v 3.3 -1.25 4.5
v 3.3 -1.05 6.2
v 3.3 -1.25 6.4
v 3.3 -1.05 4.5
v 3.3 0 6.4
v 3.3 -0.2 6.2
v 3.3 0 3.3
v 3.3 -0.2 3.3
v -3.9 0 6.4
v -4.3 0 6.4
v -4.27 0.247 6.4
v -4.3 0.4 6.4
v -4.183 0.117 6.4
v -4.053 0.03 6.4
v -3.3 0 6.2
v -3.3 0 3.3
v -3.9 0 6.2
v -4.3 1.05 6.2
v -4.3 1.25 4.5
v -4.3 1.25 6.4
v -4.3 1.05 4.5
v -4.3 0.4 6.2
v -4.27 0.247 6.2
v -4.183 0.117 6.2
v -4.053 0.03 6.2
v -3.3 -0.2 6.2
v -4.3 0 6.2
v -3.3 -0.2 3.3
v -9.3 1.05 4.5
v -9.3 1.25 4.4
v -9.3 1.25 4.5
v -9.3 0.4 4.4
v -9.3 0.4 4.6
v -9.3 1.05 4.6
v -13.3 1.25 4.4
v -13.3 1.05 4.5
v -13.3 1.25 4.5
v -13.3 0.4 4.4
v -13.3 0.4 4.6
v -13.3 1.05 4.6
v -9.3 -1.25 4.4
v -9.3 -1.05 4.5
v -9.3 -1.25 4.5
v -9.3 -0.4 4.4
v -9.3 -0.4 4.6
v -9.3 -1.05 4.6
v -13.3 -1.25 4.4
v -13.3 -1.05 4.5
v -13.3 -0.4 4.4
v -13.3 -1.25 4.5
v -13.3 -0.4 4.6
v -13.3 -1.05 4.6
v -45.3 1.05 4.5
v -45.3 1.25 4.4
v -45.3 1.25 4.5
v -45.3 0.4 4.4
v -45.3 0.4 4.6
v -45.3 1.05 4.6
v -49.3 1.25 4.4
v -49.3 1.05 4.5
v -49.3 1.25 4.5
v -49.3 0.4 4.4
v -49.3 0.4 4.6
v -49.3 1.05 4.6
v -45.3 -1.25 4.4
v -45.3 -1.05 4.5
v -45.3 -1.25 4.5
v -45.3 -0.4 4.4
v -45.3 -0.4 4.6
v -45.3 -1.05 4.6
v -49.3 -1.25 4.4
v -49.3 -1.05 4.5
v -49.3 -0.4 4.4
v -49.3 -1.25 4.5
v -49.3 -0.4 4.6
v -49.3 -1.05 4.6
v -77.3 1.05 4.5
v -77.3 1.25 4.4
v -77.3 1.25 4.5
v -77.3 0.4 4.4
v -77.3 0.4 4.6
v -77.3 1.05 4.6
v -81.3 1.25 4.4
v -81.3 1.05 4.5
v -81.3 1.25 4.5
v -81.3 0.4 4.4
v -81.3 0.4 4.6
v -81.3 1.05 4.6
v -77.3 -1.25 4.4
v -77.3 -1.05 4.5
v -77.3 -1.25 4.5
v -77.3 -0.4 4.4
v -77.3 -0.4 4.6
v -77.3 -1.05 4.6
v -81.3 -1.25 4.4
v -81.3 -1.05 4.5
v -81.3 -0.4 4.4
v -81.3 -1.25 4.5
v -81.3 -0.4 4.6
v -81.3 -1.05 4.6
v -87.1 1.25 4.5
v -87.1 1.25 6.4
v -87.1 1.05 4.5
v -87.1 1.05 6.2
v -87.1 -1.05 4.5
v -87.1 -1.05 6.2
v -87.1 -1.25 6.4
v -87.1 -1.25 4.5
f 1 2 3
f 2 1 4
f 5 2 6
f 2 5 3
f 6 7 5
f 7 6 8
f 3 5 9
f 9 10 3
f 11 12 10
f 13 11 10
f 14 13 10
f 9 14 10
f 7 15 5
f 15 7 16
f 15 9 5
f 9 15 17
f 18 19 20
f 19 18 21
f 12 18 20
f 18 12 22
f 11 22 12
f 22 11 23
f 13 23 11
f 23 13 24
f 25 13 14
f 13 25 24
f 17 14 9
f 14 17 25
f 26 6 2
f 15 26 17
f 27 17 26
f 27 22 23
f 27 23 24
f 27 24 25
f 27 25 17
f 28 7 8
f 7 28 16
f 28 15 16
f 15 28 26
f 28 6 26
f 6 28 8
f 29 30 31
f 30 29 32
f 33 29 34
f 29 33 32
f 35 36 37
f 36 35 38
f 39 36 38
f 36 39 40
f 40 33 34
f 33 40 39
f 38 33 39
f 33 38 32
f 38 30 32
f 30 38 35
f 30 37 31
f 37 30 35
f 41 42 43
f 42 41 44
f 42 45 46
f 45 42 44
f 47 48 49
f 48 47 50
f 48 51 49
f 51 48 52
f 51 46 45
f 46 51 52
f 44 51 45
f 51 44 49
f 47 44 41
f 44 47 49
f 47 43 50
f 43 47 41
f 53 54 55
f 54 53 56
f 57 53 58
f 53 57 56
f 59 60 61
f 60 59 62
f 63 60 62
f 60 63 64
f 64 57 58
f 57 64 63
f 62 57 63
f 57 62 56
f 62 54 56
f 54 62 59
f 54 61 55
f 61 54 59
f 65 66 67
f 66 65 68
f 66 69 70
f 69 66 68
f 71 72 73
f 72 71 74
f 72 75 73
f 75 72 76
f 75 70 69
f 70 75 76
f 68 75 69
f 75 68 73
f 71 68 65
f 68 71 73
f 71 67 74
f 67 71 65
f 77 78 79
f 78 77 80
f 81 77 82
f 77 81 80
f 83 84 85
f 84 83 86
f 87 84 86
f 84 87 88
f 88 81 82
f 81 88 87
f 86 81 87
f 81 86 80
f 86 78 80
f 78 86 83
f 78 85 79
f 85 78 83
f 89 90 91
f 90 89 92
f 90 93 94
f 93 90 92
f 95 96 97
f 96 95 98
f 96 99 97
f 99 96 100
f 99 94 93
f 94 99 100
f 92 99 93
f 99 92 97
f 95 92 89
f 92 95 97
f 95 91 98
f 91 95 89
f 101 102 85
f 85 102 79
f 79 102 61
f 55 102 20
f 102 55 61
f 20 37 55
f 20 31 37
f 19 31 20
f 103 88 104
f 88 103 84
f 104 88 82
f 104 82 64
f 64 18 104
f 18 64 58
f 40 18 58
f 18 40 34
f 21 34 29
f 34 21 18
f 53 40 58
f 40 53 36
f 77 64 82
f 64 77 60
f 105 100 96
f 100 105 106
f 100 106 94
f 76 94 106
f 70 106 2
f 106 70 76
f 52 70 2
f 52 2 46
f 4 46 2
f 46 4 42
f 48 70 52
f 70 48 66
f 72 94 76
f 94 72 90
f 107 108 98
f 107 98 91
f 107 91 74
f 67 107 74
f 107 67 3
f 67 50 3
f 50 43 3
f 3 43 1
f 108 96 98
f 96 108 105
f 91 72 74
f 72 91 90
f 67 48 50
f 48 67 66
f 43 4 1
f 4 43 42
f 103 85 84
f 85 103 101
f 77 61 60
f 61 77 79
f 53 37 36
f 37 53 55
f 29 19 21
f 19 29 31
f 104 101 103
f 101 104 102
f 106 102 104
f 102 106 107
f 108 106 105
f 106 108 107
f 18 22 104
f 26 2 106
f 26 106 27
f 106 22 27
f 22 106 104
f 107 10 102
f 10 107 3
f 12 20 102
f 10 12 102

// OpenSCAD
// file: ../p/1-4edge.scad
use <../lib.scad>
function ldraw_lib__1_4edge() = [
// 0 Circle 0.25
// 0 Name: 1-4edge.dat
// 0 Author: James Jessiman
// 0 !LDRAW_ORG Primitive UPDATE 2017-01
// 0 !LICENSE Licensed under CC BY 4.0 : see CAreadme.txt
// 
// 0 BFC CERTIFY CCW
  [0,"BFC","CERTIFY"],
  [0,"BFC","CCW"],
// 
// 0 !HISTORY 2007-06-22 [PTadmin] Header formatted for Contributor Agreement
// 0 !HISTORY 2008-07-01 [PTadmin] Official Update 2008-01
// 0 !HISTORY 2017-01-15 [Steffen] BFCed
// 0 !HISTORY 2017-12-30 [PTadmin] Official Update 2017-01
// 
// 
// 2 24 1 0 0 0.9239 0 0.3827
  [2,24,1,0,0,0.9239,0,0.3827],
// 2 24 0.9239 0 0.3827 0.7071 0 0.7071
  [2,24,0.9239,0,0.3827,0.7071,0,0.7071],
// 2 24 0.7071 0 0.7071 0.3827 0 0.9239
  [2,24,0.7071,0,0.7071,0.3827,0,0.9239],
// 2 24 0.3827 0 0.9239 0 0 1
  [2,24,0.3827,0,0.9239,0,0,1],
];
module ldraw_lib__1_4edge(step=0, col=false, unit=2/5, alt=false, line=0.2, solid=!$preview)
    makepoly(ldraw_lib__1_4edge(), step=step, col=col, unit=unit, alt=alt, line=line, solid=solid);
ldraw_lib__1_4edge(line=0.2);
// file: ../p/1-4cyli.scad
use <../lib.scad>
function ldraw_lib__1_4cyli() = [
// 0 Cylinder 0.25
// 0 Name: 1-4cyli.dat
// 0 Author: James Jessiman
// 0 !LDRAW_ORG Primitive UPDATE 2012-01
// 0 !LICENSE Licensed under CC BY 4.0 : see CAreadme.txt
// 
// 0 BFC CERTIFY CCW
  [0,"BFC","CERTIFY"],
  [0,"BFC","CCW"],
// 
// 0 !HISTORY 2002-03-23 [sbliss] Added BFC statement.
// 0 !HISTORY 2002-04-25 [PTadmin] Official Update 2002-02
// 0 !HISTORY 2007-06-22 [PTadmin] Header formatted for Contributor Agreement
// 0 !HISTORY 2008-07-01 [PTadmin] Official Update 2008-01
// 0 !HISTORY 2012-02-16 [Philo] Changed to CCW
// 0 !HISTORY 2012-03-30 [PTadmin] Official Update 2012-01
// 
// 
// 4 16 1 1 0 0.9239 1 0.3827 0.9239 0 0.3827 1 0 0
  [4,16,1,1,0,0.9239,1,0.3827,0.9239,0,0.3827,1,0,0],
// 5 24 1 0 0 1 1 0 0.9239 0 0.3827 1 0 -1
  [5,24,1,0,0,1,1,0,0.9239,0,0.3827,1,0,-1],
// 4 16 0.9239 1 0.3827 0.7071 1 0.7071 0.7071 0 0.7071 0.9239 0 0.3827
  [4,16,0.9239,1,0.3827,0.7071,1,0.7071,0.7071,0,0.7071,0.9239,0,0.3827],
// 5 24 0.9239 0 0.3827 0.9239 1 0.3827 0.7071 0 0.7071 1 0 0
  [5,24,0.9239,0,0.3827,0.9239,1,0.3827,0.7071,0,0.7071,1,0,0],
// 4 16 0.7071 1 0.7071 0.3827 1 0.9239 0.3827 0 0.9239 0.7071 0 0.7071
  [4,16,0.7071,1,0.7071,0.3827,1,0.9239,0.3827,0,0.9239,0.7071,0,0.7071],
// 5 24 0.7071 0 0.7071 0.7071 1 0.7071 0.3827 0 0.9239 0.9239 0 0.3827
  [5,24,0.7071,0,0.7071,0.7071,1,0.7071,0.3827,0,0.9239,0.9239,0,0.3827],
// 4 16 0.3827 1 0.9239 0 1 1 0 0 1 0.3827 0 0.9239
  [4,16,0.3827,1,0.9239,0,1,1,0,0,1,0.3827,0,0.9239],
// 5 24 0.3827 0 0.9239 0.3827 1 0.9239 0 0 1 0.7071 0 0.7071
  [5,24,0.3827,0,0.9239,0.3827,1,0.9239,0,0,1,0.7071,0,0.7071],
// 5 24 0 0 1 0 1 1 0.3827 0 0.9239 -1 0 1
  [5,24,0,0,1,0,1,1,0.3827,0,0.9239,-1,0,1],
];
module ldraw_lib__1_4cyli(step=0, col=false, unit=2/5, alt=false, line=0.2, solid=!$preview)
    makepoly(ldraw_lib__1_4cyli(), step=step, col=col, unit=unit, alt=alt, line=line, solid=solid);
ldraw_lib__1_4cyli(line=0.2);
// file: ../p/box3-3.scad
use <../lib.scad>
function ldraw_lib__box3_3() = [
// 0 Box with 3 Adjacent Faces and 3 Missing Edges
// 0 Name: box3-3.dat
// 0 Author: Mark Kennedy [mkennedy]
// 0 !LDRAW_ORG Primitive UPDATE 2004-03
// 0 !LICENSE Licensed under CC BY 4.0 : see CAreadme.txt
// 
// 0 BFC CERTIFY CCW
  [0,"BFC","CERTIFY"],
  [0,"BFC","CCW"],
// 
// 0 !HISTORY 2004-09-15 [PTadmin] Official Update 2004-03
// 0 !HISTORY 2007-06-24 [PTadmin] Header formatted for Contributor Agreement
// 0 !HISTORY 2008-07-01 [PTadmin] Official Update 2008-01
// 
// 
// 2 24 1 1 1 -1 1 1
  [2,24,1,1,1,-1,1,1],
// 2 24 -1 1 1 -1 1 -1
  [2,24,-1,1,1,-1,1,-1],
// 2 24 -1 1 -1 1 1 -1
  [2,24,-1,1,-1,1,1,-1],
// 2 24 1 1 -1 1 1 1
  [2,24,1,1,-1,1,1,1],
// 2 24 1 -1 1 -1 -1 1
  [2,24,1,-1,1,-1,-1,1],
// 2 24 1 -1 -1 1 -1 1
  [2,24,1,-1,-1,1,-1,1],
// 2 24 1 -1 1 1 1 1
  [2,24,1,-1,1,1,1,1],
// 2 24 -1 -1 1 -1 1 1
  [2,24,-1,-1,1,-1,1,1],
// 2 24 1 -1 -1 1 1 -1
  [2,24,1,-1,-1,1,1,-1],
// 0
// 4 16 1 1 1 1 1 -1 -1 1 -1 -1 1 1
  [4,16,1,1,1,1,1,-1,-1,1,-1,-1,1,1],
// 4 16 1 1 1 1 -1 1 1 -1 -1 1 1 -1
  [4,16,1,1,1,1,-1,1,1,-1,-1,1,1,-1],
// 4 16 1 1 1 -1 1 1 -1 -1 1 1 -1 1
  [4,16,1,1,1,-1,1,1,-1,-1,1,1,-1,1],
// 0
// 
];
module ldraw_lib__box3_3(step=0, col=false, unit=2/5, alt=false, line=0.2, solid=!$preview)
    makepoly(ldraw_lib__box3_3(), step=step, col=col, unit=unit, alt=alt, line=line, solid=solid);
ldraw_lib__box3_3(line=0.2);
// file: ../p/4-4edge.scad
use <../lib.scad>
function ldraw_lib__4_4edge() = [
// 0 Circle 1.0
// 0 Name: 4-4edge.dat
// 0 Author: James Jessiman
// 0 !LDRAW_ORG Primitive UPDATE 2017-01
// 0 !LICENSE Licensed under CC BY 4.0 : see CAreadme.txt
// 
// 0 BFC CERTIFY CCW
  [0,"BFC","CERTIFY"],
  [0,"BFC","CCW"],
// 
// 0 !HISTORY 1998-12-15 [PTadmin] Official Update 1998-10
// 0 !HISTORY 2005-12-28 [PTadmin] Official Update 2005-01
// 0 !HISTORY 2007-06-24 [PTadmin] Header formatted for Contributor Agreement
// 0 !HISTORY 2008-07-01 [PTadmin] Official Update 2008-01
// 0 !HISTORY 2017-01-15 [Steffen] BFCed
// 0 !HISTORY 2017-12-30 [PTadmin] Official Update 2017-01
// 
// 
// 2 24 1 0 0 0.9239 0 0.3827
  [2,24,1,0,0,0.9239,0,0.3827],
// 2 24 0.9239 0 0.3827 0.7071 0 0.7071
  [2,24,0.9239,0,0.3827,0.7071,0,0.7071],
// 2 24 0.7071 0 0.7071 0.3827 0 0.9239
  [2,24,0.7071,0,0.7071,0.3827,0,0.9239],
// 2 24 0.3827 0 0.9239 0 0 1
  [2,24,0.3827,0,0.9239,0,0,1],
// 2 24 0 0 1 -0.3827 0 0.9239
  [2,24,0,0,1,-0.3827,0,0.9239],
// 2 24 -0.3827 0 0.9239 -0.7071 0 0.7071
  [2,24,-0.3827,0,0.9239,-0.7071,0,0.7071],
// 2 24 -0.7071 0 0.7071 -0.9239 0 0.3827
  [2,24,-0.7071,0,0.7071,-0.9239,0,0.3827],
// 2 24 -0.9239 0 0.3827 -1 0 -0
  [2,24,-0.9239,0,0.3827,-1,0,-0],
// 2 24 -1 0 -0 -0.9239 0 -0.3827
  [2,24,-1,0,-0,-0.9239,0,-0.3827],
// 2 24 -0.9239 0 -0.3827 -0.7071 0 -0.7071
  [2,24,-0.9239,0,-0.3827,-0.7071,0,-0.7071],
// 2 24 -0.7071 0 -0.7071 -0.3827 0 -0.9239
  [2,24,-0.7071,0,-0.7071,-0.3827,0,-0.9239],
// 2 24 -0.3827 0 -0.9239 0 0 -1
  [2,24,-0.3827,0,-0.9239,0,0,-1],
// 2 24 0 0 -1 0.3827 0 -0.9239
  [2,24,0,0,-1,0.3827,0,-0.9239],
// 2 24 0.3827 0 -0.9239 0.7071 0 -0.7071
  [2,24,0.3827,0,-0.9239,0.7071,0,-0.7071],
// 2 24 0.7071 0 -0.7071 0.9239 0 -0.3827
  [2,24,0.7071,0,-0.7071,0.9239,0,-0.3827],
// 2 24 0.9239 0 -0.3827 1 0 0
  [2,24,0.9239,0,-0.3827,1,0,0],
];
module ldraw_lib__4_4edge(step=0, col=false, unit=2/5, alt=false, line=0.2, solid=!$preview)
    makepoly(ldraw_lib__4_4edge(), step=step, col=col, unit=unit, alt=alt, line=line, solid=solid);
ldraw_lib__4_4edge(line=0.2);
// file: ../p/1-4ndis.scad
use <../lib.scad>
function ldraw_lib__1_4ndis() = [
// 0 Disc Negative 0.25
// 0 Name: 1-4ndis.dat
// 0 Author: James Jessiman
// 0 !LDRAW_ORG Primitive UPDATE 2012-01
// 0 !LICENSE Licensed under CC BY 4.0 : see CAreadme.txt
// 
// 0 BFC CERTIFY CCW
  [0,"BFC","CERTIFY"],
  [0,"BFC","CCW"],
// 
// 0 !HISTORY 2002-03-23 [sbliss] Added BFC Statement
// 0 !HISTORY 2002-04-25 [PTadmin] Official Update 2002-02
// 0 !HISTORY 2007-06-22 [PTadmin] Header formatted for Contributor Agreement
// 0 !HISTORY 2008-07-01 [PTadmin] Official Update 2008-01
// 0 !HISTORY 2012-02-16 [Philo] Changed to CCW
// 0 !HISTORY 2012-03-30 [PTadmin] Official Update 2012-01
// 
// 
// 3 16 0.9239 0 0.3827 1 0 0 1 0 1
  [3,16,0.9239,0,0.3827,1,0,0,1,0,1],
// 3 16 0.7071 0 0.7071 0.9239 0 0.3827 1 0 1
  [3,16,0.7071,0,0.7071,0.9239,0,0.3827,1,0,1],
// 3 16 0.3827 0 0.9239 0.7071 0 0.7071 1 0 1
  [3,16,0.3827,0,0.9239,0.7071,0,0.7071,1,0,1],
// 3 16 0 0 1 0.3827 0 0.9239 1 0 1
  [3,16,0,0,1,0.3827,0,0.9239,1,0,1],
];
module ldraw_lib__1_4ndis(step=0, col=false, unit=2/5, alt=false, line=0.2, solid=!$preview)
    makepoly(ldraw_lib__1_4ndis(), step=step, col=col, unit=unit, alt=alt, line=line, solid=solid);
ldraw_lib__1_4ndis(line=0.2);
// file: ../p/1-4cylo.scad
use <../lib.scad>
use <1-4cyli.scad>
use <1-4edge.scad>
function ldraw_lib__1_4cylo() = [
// 0 Cylinder Open 0.25
// 0 Name: 1-4cylo.dat
// 0 Author: Max Martin Richter [MMR1988]
// 0 !LDRAW_ORG Primitive UPDATE 2010-03
// 0 !LICENSE Licensed under CC BY 4.0 : see CAreadme.txt
// 
// 0 BFC CERTIFY CCW
  [0,"BFC","CERTIFY"],
  [0,"BFC","CCW"],
// 
// 0 !HISTORY 2010-12-31 [PTadmin] Official Update 2010-03
// 
// 
// 1 16 0 0 0 1 0 0 0 1 0 0 0 1 1-4edge.dat
  [1,16,0,0,0,1,0,0,0,1,0,0,0,1, ldraw_lib__1_4edge()],
// 1 16 0 1 0 1 0 0 0 1 0 0 0 1 1-4edge.dat
  [1,16,0,1,0,1,0,0,0,1,0,0,0,1, ldraw_lib__1_4edge()],
// 1 16 0 0 0 1 0 0 0 1 0 0 0 1 1-4cyli.dat
  [1,16,0,0,0,1,0,0,0,1,0,0,0,1, ldraw_lib__1_4cyli()],
];
module ldraw_lib__1_4cylo(step=0, col=false, unit=2/5, alt=false, line=0.2, solid=!$preview)
    makepoly(ldraw_lib__1_4cylo(), step=step, col=col, unit=unit, alt=alt, line=line, solid=solid);
ldraw_lib__1_4cylo(line=0.2);
// file: ../p/box2-7.scad
use <../lib.scad>
function ldraw_lib__box2_7() = [
// 0 Box with  2 Faces without  7 Edges
// 0 Name: box2-7.dat
// 0 Author: Willy Tschager [Holly-Wood]
// 0 !LDRAW_ORG Primitive UPDATE 2024-01
// 0 !LICENSE Licensed under CC BY 4.0 : see CAreadme.txt
// 
// 0 BFC CERTIFY CCW
  [0,"BFC","CERTIFY"],
  [0,"BFC","CCW"],
// 
// 0 !HISTORY 2009-05-02 [PTadmin] Official Update 2009-01
// 0 !HISTORY 2024-01-02 [Holly-Wood] Complete re-write, original by guyvivan
// 0 !HISTORY 2024-01-29 [OrionP] Official Update 2024-01
// 
// 2 24 -1 1 -1 -1 1 1
  [2,24,-1,1,-1,-1,1,1],
// 2 24 1 1 1 1 1 -1
  [2,24,1,1,1,1,1,-1],
// 4 16 -1 1 1 1 1 1 1 1 -1 -1 1 -1
  [4,16,-1,1,1,1,1,1,1,1,-1,-1,1,-1],
// 
// 2 24 -1 1 1 -1 -1 1
  [2,24,-1,1,1,-1,-1,1],
// 2 24 1 1 1 1 -1 1
  [2,24,1,1,1,1,-1,1],
// 4 16 1 -1 1 1 1 1 -1 1 1 -1 -1 1
  [4,16,1,-1,1,1,1,1,-1,1,1,-1,-1,1],
// 
// 2 24 -1 1 1 1 1 1
  [2,24,-1,1,1,1,1,1],
];
module ldraw_lib__box2_7(step=0, col=false, unit=2/5, alt=false, line=0.2, solid=!$preview)
    makepoly(ldraw_lib__box2_7(), step=step, col=col, unit=unit, alt=alt, line=line, solid=solid);
ldraw_lib__box2_7(line=0.2);
// file: ../p/box2-5.scad
use <../lib.scad>
function ldraw_lib__box2_5() = [
// 0 Box with 2 Faces without 5 Edges
// 0 Name: box2-5.dat
// 0 Author: Steffen [Steffen]
// 0 !LDRAW_ORG Primitive UPDATE 2003-03
// 0 !LICENSE Licensed under CC BY 4.0 : see CAreadme.txt
// 
// 0 BFC CERTIFY CCW
  [0,"BFC","CERTIFY"],
  [0,"BFC","CCW"],
// 
// 0 !HISTORY 2003-12-19 [PTadmin] Official Update 2003-03
// 0 !HISTORY 2007-06-24 [PTadmin] Header formatted for Contributor Agreement
// 0 !HISTORY 2008-07-01 [PTadmin] Official Update 2008-01
// 
// 
// 2 24 1 1 1 -1 1 1
  [2,24,1,1,1,-1,1,1],
// 2 24 1 1 -1 -1 1 -1
  [2,24,1,1,-1,-1,1,-1],
// 2 24 1 -1 1 -1 -1 1
  [2,24,1,-1,1,-1,-1,1],
// 2 24 -1 -1 1 -1 1 1
  [2,24,-1,-1,1,-1,1,1],
// 2 24 1 -1 1 1 1 1
  [2,24,1,-1,1,1,1,1],
// 2 24 -1 1 -1 -1 1 1
  [2,24,-1,1,-1,-1,1,1],
// 2 24 1 1 -1 1 1 1
  [2,24,1,1,-1,1,1,1],
// 4 16 1 1 1 1 1 -1 -1 1 -1 -1 1 1
  [4,16,1,1,1,1,1,-1,-1,1,-1,-1,1,1],
// 4 16 1 1 1 -1 1 1 -1 -1 1 1 -1 1
  [4,16,1,1,1,-1,1,1,-1,-1,1,1,-1,1],
// 0
];
module ldraw_lib__box2_5(step=0, col=false, unit=2/5, alt=false, line=0.2, solid=!$preview)
    makepoly(ldraw_lib__box2_5(), step=step, col=col, unit=unit, alt=alt, line=line, solid=solid);
ldraw_lib__box2_5(line=0.2);
// file: s/u9611s03.scad
use <../../lib.scad>
use <../../p/1-4cylo.scad>
use <../../p/1-4ndis.scad>
use <../../p/4-4edge.scad>
use <../../p/box3-3.scad>
function ldraw_lib__s__u9611s03() = [
// 0 ~Train Track  9V Straight - Metal Rail, Interlocking End
// 0 Name: s\u9611s03.dat
// 0 Author: Max Martin Richter [MMR1988]
// 0 !LDRAW_ORG Subpart UPDATE 2025-02
// 0 !LICENSE Licensed under CC BY 4.0 : see CAreadme.txt
// 
// 0 BFC CERTIFY CCW
  [0,"BFC","CERTIFY"],
  [0,"BFC","CCW"],
// 
// 0 !HISTORY 2025-02-27 [OrionP] Official Update 2025-02
// 
// 4 16 8.25 -15.5 -2.625 8.25 -16 -3.125 8.25 -11.25 -3.125 8.25 -11.25 -2.625
  [4,16,8.25,-15.5,-2.625,8.25,-16,-3.125,8.25,-11.25,-3.125,8.25,-11.25,-2.625],
// 4 16 8.25 -16 -3.125 8.25 -15.5 -2.625 8.25 -15.5 -.5 8.25 -16 0
  [4,16,8.25,-16,-3.125,8.25,-15.5,-2.625,8.25,-15.5,-.5,8.25,-16,0],
// 4 16 8.25 -16 0 8.25 -15.5 -.5 8.25 -8.25 -.5 8.25 -8.25 0
  [4,16,8.25,-16,0,8.25,-15.5,-.5,8.25,-8.25,-.5,8.25,-8.25,0],
// 2 24 8.25 -8.25 0 8.25 -16 0
  [2,24,8.25,-8.25,0,8.25,-16,0],
// 2 24 8.25 -16 0 8.25 -16 -3.125
  [2,24,8.25,-16,0,8.25,-16,-3.125],
// 2 24 8.25 -15.5 -.5 8.25 -15.5 -2.625
  [2,24,8.25,-15.5,-.5,8.25,-15.5,-2.625],
// 2 24 8.25 -16 -3.125 8.25 -11.25 -3.125
  [2,24,8.25,-16,-3.125,8.25,-11.25,-3.125],
// 2 24 8.25 -11.25 -2.625 8.25 -15.5 -2.625
  [2,24,8.25,-11.25,-2.625,8.25,-15.5,-2.625],
// 
// 3 16 8.25 -16 -3.125 8.25 -16 0 -9.75 -16 0
  [3,16,8.25,-16,-3.125,8.25,-16,0,-9.75,-16,0],
// 3 16 -9.75 -16 0 -10.75 -16 0 8.25 -16 -3.125
  [3,16,-9.75,-16,0,-10.75,-16,0,8.25,-16,-3.125],
// 1 16 -9.75 -16 1 -1 0 0 0 1 0 0 0 -1 1-4ndis.dat
  [1,16,-9.75,-16,1,-1,0,0,0,1,0,0,0,-1, ldraw_lib__1_4ndis()],
// 
// 4 16 8.25 -16 0 8.25 -8.25 0 -8.25 -8.25 0 -8.25 -15.5 0
  [4,16,8.25,-16,0,8.25,-8.25,0,-8.25,-8.25,0,-8.25,-15.5,0],
// 4 16 -9.75 -16 0 8.25 -16 0 -8.25 -15.5 0 -9.75 -15.5 0
  [4,16,-9.75,-16,0,8.25,-16,0,-8.25,-15.5,0,-9.75,-15.5,0],
// 2 24 -9.75 -15.5 0 -8.25 -15.5 0
  [2,24,-9.75,-15.5,0,-8.25,-15.5,0],
// 2 24 8.25 -16 0 -9.75 -16 0
  [2,24,8.25,-16,0,-9.75,-16,0],
// 2 24 -8.25 -15.5 0 -4.5 -8.25 0
  [2,24,-8.25,-15.5,0,-4.5,-8.25,0],
// 2 24 8.25 -15.5 0 4.5 -8.25 0
  [2,24,8.25,-15.5,0,4.5,-8.25,0],
// 1 16 -2 -10.75 0 1 0 0 0 0 1 0 -1 0 4-4edge.dat
  [1,16,-2,-10.75,0,1,0,0,0,0,1,0,-1,0, ldraw_lib__4_4edge()],
// 
// 4 16 -10.75 -16 3.125 -10.75 -15.5 2.625 -10.75 -11.25 2.625 -10.75 -11.25 3.125
  [4,16,-10.75,-16,3.125,-10.75,-15.5,2.625,-10.75,-11.25,2.625,-10.75,-11.25,3.125],
// 4 16 -10.75 -16 1 -10.75 -15.5 1 -10.75 -15.5 2.625 -10.75 -16 3.125
  [4,16,-10.75,-16,1,-10.75,-15.5,1,-10.75,-15.5,2.625,-10.75,-16,3.125],
// 0 BFC INVERTNEXT
  [0,"BFC","INVERTNEXT"],
// 1 16 -9.75 -16 1 -1 0 0 0 .5 0 0 0 -1 1-4cylo.dat
  [1,16,-9.75,-16,1,-1,0,0,0,.5,0,0,0,-1, ldraw_lib__1_4cylo()],
// 2 24 -10.75 -16 1 -10.75 -16 3.125
  [2,24,-10.75,-16,1,-10.75,-16,3.125],
// 2 24 -10.75 -15.5 1 -10.75 -15.5 2.625
  [2,24,-10.75,-15.5,1,-10.75,-15.5,2.625],
// 2 24 -10.75 -16 3.125 -10.75 -11.25 3.125
  [2,24,-10.75,-16,3.125,-10.75,-11.25,3.125],
// 2 24 -10.75 -15.5 2.625 -10.75 -11.25 2.625
  [2,24,-10.75,-15.5,2.625,-10.75,-11.25,2.625],
// 
// 3 16 -8.25 -15.5 -.5 8.25 -15.5 -.5 8.25 -15.5 -2.625
  [3,16,-8.25,-15.5,-.5,8.25,-15.5,-.5,8.25,-15.5,-2.625],
// 3 16 -8.25 -15.5 0 -8.25 -15.5 -.5 -9.75 -15.5 0
  [3,16,-8.25,-15.5,0,-8.25,-15.5,-.5,-9.75,-15.5,0],
// 3 16 -10.75 -15.5 0 -9.75 -15.5 0 -8.25 -15.5 -.5
  [3,16,-10.75,-15.5,0,-9.75,-15.5,0,-8.25,-15.5,-.5],
// 1 16 -9.75 -15.5 1 -1 0 0 0 -1 0 0 0 -1 1-4ndis.dat
  [1,16,-9.75,-15.5,1,-1,0,0,0,-1,0,0,0,-1, ldraw_lib__1_4ndis()],
// 
// 1 16 0 -11.875 -.25 -8.25 0 0 0 3.625 0 0 0 -.25 box3-3.dat
  [1,16,0,-11.875,-.25,-8.25,0,0,0,3.625,0,0,0,-.25, ldraw_lib__box3_3()],
];
module ldraw_lib__s__u9611s03(step=0, col=false, unit=2/5, alt=false, line=0.2, solid=!$preview)
    makepoly(ldraw_lib__s__u9611s03(), step=step, col=col, unit=unit, alt=alt, line=line, solid=solid);
ldraw_lib__s__u9611s03(line=0.2);
// file: s/u9611s02.scad
use <../../lib.scad>
use <../../p/box2-5.scad>
use <../../p/box2-7.scad>
function ldraw_lib__s__u9611s02() = [
// 0 ~Train Track  9V Straight - Metal Rail, Clamp
// 0 Name: s\u9611s02.dat
// 0 Author: Max Martin Richter [MMR1988]
// 0 !LDRAW_ORG Subpart UPDATE 2025-02
// 0 !LICENSE Licensed under CC BY 4.0 : see CAreadme.txt
// 
// 0 BFC CERTIFY CCW
  [0,"BFC","CERTIFY"],
  [0,"BFC","CCW"],
// 
// 0 !HISTORY 2025-02-27 [OrionP] Official Update 2025-02
// 
// 4 16 5 -11 3.125 5 -11.25 3.125 5 -11.25 2.625 5 -11 1
  [4,16,5,-11,3.125,5,-11.25,3.125,5,-11.25,2.625,5,-11,1],
// 4 16 5 -11.25 2.625 5 -11.5 2.625 5 -11.5 1 5 -11 1
  [4,16,5,-11.25,2.625,5,-11.5,2.625,5,-11.5,1,5,-11,1],
// 4 16 -5 -11.25 2.625 -5 -11.25 3.125 -5 -11 3.125 -5 -11 1
  [4,16,-5,-11.25,2.625,-5,-11.25,3.125,-5,-11,3.125,-5,-11,1],
// 4 16 -5 -11.25 2.625 -5 -11 1 -5 -11.5 1 -5 -11.5 2.625
  [4,16,-5,-11.25,2.625,-5,-11,1,-5,-11.5,1,-5,-11.5,2.625],
// 1 16 0 -11.25 1.8125 5 0 0 0 -.25 0 0 0 -.8125 box2-5.dat
  [1,16,0,-11.25,1.8125,5,0,0,0,-.25,0,0,0,-.8125, ldraw_lib__box2_5()],
// 1 16 0 -11.125 2.0625 5 0 0 0 .125 0 0 0 1.0625 box2-7.dat
  [1,16,0,-11.125,2.0625,5,0,0,0,.125,0,0,0,1.0625, ldraw_lib__box2_7()],
// 2 24 5 -11.5 2.625 5 -11.25 2.625
  [2,24,5,-11.5,2.625,5,-11.25,2.625],
// 2 24 -5 -11.5 2.625 -5 -11.25 2.625
  [2,24,-5,-11.5,2.625,-5,-11.25,2.625],
// 
// 4 16 5 -11.25 -2.625 5 -11.25 -3.125 5 -11 -3.125 5 -11 -1
  [4,16,5,-11.25,-2.625,5,-11.25,-3.125,5,-11,-3.125,5,-11,-1],
// 4 16 5 -11.5 -1 5 -11.5 -2.625 5 -11.25 -2.625 5 -11 -1
  [4,16,5,-11.5,-1,5,-11.5,-2.625,5,-11.25,-2.625,5,-11,-1],
// 4 16 -5 -11 -3.125 -5 -11.25 -3.125 -5 -11.25 -2.625 -5 -11 -1
  [4,16,-5,-11,-3.125,-5,-11.25,-3.125,-5,-11.25,-2.625,-5,-11,-1],
// 4 16 -5 -11.5 -1 -5 -11 -1 -5 -11.25 -2.625 -5 -11.5 -2.625
  [4,16,-5,-11.5,-1,-5,-11,-1,-5,-11.25,-2.625,-5,-11.5,-2.625],
// 1 16 0 -11.25 -1.8125 5 0 0 0 -.25 0 0 0 .8125 box2-5.dat
  [1,16,0,-11.25,-1.8125,5,0,0,0,-.25,0,0,0,.8125, ldraw_lib__box2_5()],
// 1 16 0 -11.125 -2.0625 5 0 0 0 .125 0 0 0 -1.0625 box2-7.dat
  [1,16,0,-11.125,-2.0625,5,0,0,0,.125,0,0,0,-1.0625, ldraw_lib__box2_7()],
// 2 24 5 -11.5 -2.625 5 -11.25 -2.625
  [2,24,5,-11.5,-2.625,5,-11.25,-2.625],
// 2 24 -5 -11.5 -2.625 -5 -11.25 -2.625
  [2,24,-5,-11.5,-2.625,-5,-11.25,-2.625],
];
module ldraw_lib__s__u9611s02(step=0, col=false, unit=2/5, alt=false, line=0.2, solid=!$preview)
    makepoly(ldraw_lib__s__u9611s02(), step=step, col=col, unit=unit, alt=alt, line=line, solid=solid);
ldraw_lib__s__u9611s02(line=0.2);
// file: ../p/recte3.scad
use <../lib.scad>
function ldraw_lib__recte3() = [
// 0 Rectangle Empty with 3 Edges
// 0 Name: recte3.dat
// 0 Author: Steffen [Steffen]
// 0 !LDRAW_ORG Primitive UPDATE 2011-01
// 0 !LICENSE Licensed under CC BY 4.0 : see CAreadme.txt
// 
// 0 BFC CERTIFY CCW
  [0,"BFC","CERTIFY"],
  [0,"BFC","CCW"],
// 
// 0 !HISTORY 2011-07-25 [PTadmin] Official Update 2011-01
// 
// 
// 2 24 1 0 1 -1 0 1
  [2,24,1,0,1,-1,0,1],
// 2 24 -1 0 1 -1 0 -1
  [2,24,-1,0,1,-1,0,-1],
// 2 24 1 0 -1 1 0 1
  [2,24,1,0,-1,1,0,1],
];
module ldraw_lib__recte3(step=0, col=false, unit=2/5, alt=false, line=0.2, solid=!$preview)
    makepoly(ldraw_lib__recte3(), step=step, col=col, unit=unit, alt=alt, line=line, solid=solid);
ldraw_lib__recte3(line=0.2);
// file: ../p/rect.scad
use <../lib.scad>
function ldraw_lib__rect() = [
// 0 Rectangle
// 0 Name: rect.dat
// 0 Author: James Jessiman
// 0 !LDRAW_ORG Primitive UPDATE 2010-01
// 0 !LICENSE Licensed under CC BY 4.0 : see CAreadme.txt
// 
// 0 BFC CERTIFY CCW
  [0,"BFC","CERTIFY"],
  [0,"BFC","CCW"],
// 
// 0 !HISTORY 2002-04-05 [hafhead] Added BFC statement
// 0 !HISTORY 2002-04-25 [PTadmin] Official Update 2002-02
// 0 !HISTORY 2007-06-24 [PTadmin] Header formatted for Contributor Agreement
// 0 !HISTORY 2008-07-01 [PTadmin] Official Update 2008-01
// 0 !HISTORY 2010-01-17 [mikeheide] changed winding to CCW
// 0 !HISTORY 2010-04-05 [PTadmin] Official Update 2010-01
// 
// 
// 2 24 1 0 1 -1 0 1
  [2,24,1,0,1,-1,0,1],
// 2 24 -1 0 1 -1 0 -1
  [2,24,-1,0,1,-1,0,-1],
// 2 24 -1 0 -1 1 0 -1
  [2,24,-1,0,-1,1,0,-1],
// 2 24 1 0 -1 1 0 1
  [2,24,1,0,-1,1,0,1],
// 4 16 -1 0 1 -1 0 -1 1 0 -1 1 0 1
  [4,16,-1,0,1,-1,0,-1,1,0,-1,1,0,1],
// 0
];
module ldraw_lib__rect(step=0, col=false, unit=2/5, alt=false, line=0.2, solid=!$preview)
    makepoly(ldraw_lib__rect(), step=step, col=col, unit=unit, alt=alt, line=line, solid=solid);
ldraw_lib__rect(line=0.2);
// main file
use <../lib.scad>
use <../p/rect.scad>
use <../p/recte3.scad>
use <s/u9611s02.scad>
use <s/u9611s03.scad>
function ldraw_lib__u9309() = [
// 0 ~Train Track  9V Switch Right - Straight Metal Rail
// 0 Name: u9309.dat
// 0 Author: Max Martin Richter [MMR1988]
// 0 !LDRAW_ORG Part UPDATE 2025-08
// 0 !LICENSE Licensed under CC BY 4.0 : see CAreadme.txt
// 
// 0 BFC CERTIFY CCW
  [0,"BFC","CERTIFY"],
  [0,"BFC","CCW"],
// 
// 0 !HISTORY 2025-08-31 [OrionP] Official Update 2025-08
// 
// 1 16 0 0 0 1 0 0 0 1 0 0 0 1 s\u9611s03.dat
  [1,16,0,0,0,1,0,0,0,1,0,0,0,1, ldraw_lib__s__u9611s03()],
// 
// 1 16 -28.25 0 0 1 0 0 0 1 0 0 0 1 s\u9611s02.dat
  [1,16,-28.25,0,0,1,0,0,0,1,0,0,0,1, ldraw_lib__s__u9611s02()],
// 1 16 -118.25 0 0 1 0 0 0 1 0 0 0 1 s\u9611s02.dat
  [1,16,-118.25,0,0,1,0,0,0,1,0,0,0,1, ldraw_lib__s__u9611s02()],
// 1 16 -198.25 0 0 1 0 0 0 1 0 0 0 1 s\u9611s02.dat
  [1,16,-198.25,0,0,1,0,0,0,1,0,0,0,1, ldraw_lib__s__u9611s02()],
// 
// 3 16 -217.75 -11.25 3.125 -217.75 -16 3.125 -203.25 -11.25 3.125
  [3,16,-217.75,-11.25,3.125,-217.75,-16,3.125,-203.25,-11.25,3.125],
// 3 16 -203.25 -11.25 3.125 -217.75 -16 3.125 -193.25 -11.25 3.125
  [3,16,-203.25,-11.25,3.125,-217.75,-16,3.125,-193.25,-11.25,3.125],
// 3 16 -193.25 -11.25 3.125 -217.75 -16 3.125 -123.25 -11.25 3.125
  [3,16,-193.25,-11.25,3.125,-217.75,-16,3.125,-123.25,-11.25,3.125],
// 4 16 -113.25 -11.25 3.125 -123.25 -11.25 3.125 -217.75 -16 3.125 -10.75 -16 3.125
  [4,16,-113.25,-11.25,3.125,-123.25,-11.25,3.125,-217.75,-16,3.125,-10.75,-16,3.125],
// 3 16 -10.75 -16 3.125 -33.25 -11.25 3.125 -113.25 -11.25 3.125
  [3,16,-10.75,-16,3.125,-33.25,-11.25,3.125,-113.25,-11.25,3.125],
// 3 16 -10.75 -16 3.125 -23.25 -11.25 3.125 -33.25 -11.25 3.125
  [3,16,-10.75,-16,3.125,-23.25,-11.25,3.125,-33.25,-11.25,3.125],
// 3 16 -10.75 -11.25 3.125 -23.25 -11.25 3.125 -10.75 -16 3.125
  [3,16,-10.75,-11.25,3.125,-23.25,-11.25,3.125,-10.75,-16,3.125],
// 
// 4 16 -203.25 -11.5 2.625 -217.75 -15.5 2.625 -217.75 -11.25 2.625 -203.25 -11.25 2.625
  [4,16,-203.25,-11.5,2.625,-217.75,-15.5,2.625,-217.75,-11.25,2.625,-203.25,-11.25,2.625],
// 3 16 -217.75 -15.5 2.625 -203.25 -11.5 2.625 -193.25 -11.5 2.625
  [3,16,-217.75,-15.5,2.625,-203.25,-11.5,2.625,-193.25,-11.5,2.625],
// 3 16 -217.75 -15.5 2.625 -193.25 -11.5 2.625 -123.25 -11.5 2.625
  [3,16,-217.75,-15.5,2.625,-193.25,-11.5,2.625,-123.25,-11.5,2.625],
// 4 16 -113.25 -11.5 2.625 -10.75 -15.5 2.625 -217.75 -15.5 2.625 -123.25 -11.5 2.625
  [4,16,-113.25,-11.5,2.625,-10.75,-15.5,2.625,-217.75,-15.5,2.625,-123.25,-11.5,2.625],
// 3 16 -33.25 -11.5 2.625 -10.75 -15.5 2.625 -113.25 -11.5 2.625
  [3,16,-33.25,-11.5,2.625,-10.75,-15.5,2.625,-113.25,-11.5,2.625],
// 3 16 -10.75 -15.5 2.625 -33.25 -11.5 2.625 -23.25 -11.5 2.625
  [3,16,-10.75,-15.5,2.625,-33.25,-11.5,2.625,-23.25,-11.5,2.625],
// 4 16 -10.75 -15.5 2.625 -23.25 -11.5 2.625 -23.25 -11.25 2.625 -10.75 -11.25 2.625
  [4,16,-10.75,-15.5,2.625,-23.25,-11.5,2.625,-23.25,-11.25,2.625,-10.75,-11.25,2.625],
// 4 16 -113.25 -11.25 2.625 -33.25 -11.25 2.625 -33.25 -11.5 2.625 -113.25 -11.5 2.625
  [4,16,-113.25,-11.25,2.625,-33.25,-11.25,2.625,-33.25,-11.5,2.625,-113.25,-11.5,2.625],
// 4 16 -193.25 -11.25 2.625 -123.25 -11.25 2.625 -123.25 -11.5 2.625 -193.25 -11.5 2.625
  [4,16,-193.25,-11.25,2.625,-123.25,-11.25,2.625,-123.25,-11.5,2.625,-193.25,-11.5,2.625],
// 
// 4 16 -217.75 -11.25 -2.625 -217.75 -15.5 -2.625 -203.25 -11.5 -2.625 -203.25 -11.25 -2.625
  [4,16,-217.75,-11.25,-2.625,-217.75,-15.5,-2.625,-203.25,-11.5,-2.625,-203.25,-11.25,-2.625],
// 3 16 -203.25 -11.5 -2.625 -217.75 -15.5 -2.625 -193.25 -11.5 -2.625
  [3,16,-203.25,-11.5,-2.625,-217.75,-15.5,-2.625,-193.25,-11.5,-2.625],
// 3 16 -123.25 -11.5 -2.625 -193.25 -11.5 -2.625 -217.75 -15.5 -2.625
  [3,16,-123.25,-11.5,-2.625,-193.25,-11.5,-2.625,-217.75,-15.5,-2.625],
// 4 16 -113.25 -11.5 -2.625 -123.25 -11.5 -2.625 -217.75 -15.5 -2.625 8.25 -15.5 -2.625
  [4,16,-113.25,-11.5,-2.625,-123.25,-11.5,-2.625,-217.75,-15.5,-2.625,8.25,-15.5,-2.625],
// 3 16 -33.25 -11.5 -2.625 -113.25 -11.5 -2.625 8.25 -15.5 -2.625
  [3,16,-33.25,-11.5,-2.625,-113.25,-11.5,-2.625,8.25,-15.5,-2.625],
// 3 16 -33.25 -11.5 -2.625 8.25 -15.5 -2.625 -23.25 -11.5 -2.625
  [3,16,-33.25,-11.5,-2.625,8.25,-15.5,-2.625,-23.25,-11.5,-2.625],
// 4 16 -23.25 -11.5 -2.625 8.25 -15.5 -2.625 8.25 -11.25 -2.625 -23.25 -11.25 -2.625
  [4,16,-23.25,-11.5,-2.625,8.25,-15.5,-2.625,8.25,-11.25,-2.625,-23.25,-11.25,-2.625],
// 4 16 -113.25 -11.25 -2.625 -113.25 -11.5 -2.625 -33.25 -11.5 -2.625 -33.25 -11.25 -2.625
  [4,16,-113.25,-11.25,-2.625,-113.25,-11.5,-2.625,-33.25,-11.5,-2.625,-33.25,-11.25,-2.625],
// 4 16 -193.25 -11.25 -2.625 -193.25 -11.5 -2.625 -123.25 -11.5 -2.625 -123.25 -11.25 -2.625
  [4,16,-193.25,-11.25,-2.625,-193.25,-11.5,-2.625,-123.25,-11.5,-2.625,-123.25,-11.25,-2.625],
// 
// 3 16 -217.75 -16 -3.125 -217.75 -11.25 -3.125 -203.25 -11.25 -3.125
  [3,16,-217.75,-16,-3.125,-217.75,-11.25,-3.125,-203.25,-11.25,-3.125],
// 3 16 -217.75 -16 -3.125 -203.25 -11.25 -3.125 -193.25 -11.25 -3.125
  [3,16,-217.75,-16,-3.125,-203.25,-11.25,-3.125,-193.25,-11.25,-3.125],
// 3 16 -217.75 -16 -3.125 -193.25 -11.25 -3.125 -123.25 -11.25 -3.125
  [3,16,-217.75,-16,-3.125,-193.25,-11.25,-3.125,-123.25,-11.25,-3.125],
// 4 16 -217.75 -16 -3.125 -123.25 -11.25 -3.125 -113.25 -11.25 -3.125 8.25 -16 -3.125
  [4,16,-217.75,-16,-3.125,-123.25,-11.25,-3.125,-113.25,-11.25,-3.125,8.25,-16,-3.125],
// 3 16 -113.25 -11.25 -3.125 -33.25 -11.25 -3.125 8.25 -16 -3.125
  [3,16,-113.25,-11.25,-3.125,-33.25,-11.25,-3.125,8.25,-16,-3.125],
// 3 16 -33.25 -11.25 -3.125 -23.25 -11.25 -3.125 8.25 -16 -3.125
  [3,16,-33.25,-11.25,-3.125,-23.25,-11.25,-3.125,8.25,-16,-3.125],
// 3 16 8.25 -16 -3.125 -23.25 -11.25 -3.125 8.25 -11.25 -3.125
  [3,16,8.25,-16,-3.125,-23.25,-11.25,-3.125,8.25,-11.25,-3.125],
// 
// 1 16 -210.5 -11.25 -2.875 7.25 0 0 0 -1 0 0 0 -.25 rect.dat
  [1,16,-210.5,-11.25,-2.875,7.25,0,0,0,-1,0,0,0,-.25, ldraw_lib__rect()],
// 1 16 -158.25 -11.25 -2.875 35 0 0 0 -1 0 0 0 -.25 rect.dat
  [1,16,-158.25,-11.25,-2.875,35,0,0,0,-1,0,0,0,-.25, ldraw_lib__rect()],
// 1 16 -73.25 -11.25 -2.875 40 0 0 0 -1 0 0 0 -.25 rect.dat
  [1,16,-73.25,-11.25,-2.875,40,0,0,0,-1,0,0,0,-.25, ldraw_lib__rect()],
// 1 16 -7.5 -11.25 -2.875 -15.75 0 0 0 -1 0 0 0 .25 rect.dat
  [1,16,-7.5,-11.25,-2.875,-15.75,0,0,0,-1,0,0,0,.25, ldraw_lib__rect()],
// 1 16 -210.5 -11.25 2.875 7.25 0 0 0 -1 0 0 0 .25 rect.dat
  [1,16,-210.5,-11.25,2.875,7.25,0,0,0,-1,0,0,0,.25, ldraw_lib__rect()],
// 1 16 -158.25 -11.25 2.875 35 0 0 0 -1 0 0 0 .25 rect.dat
  [1,16,-158.25,-11.25,2.875,35,0,0,0,-1,0,0,0,.25, ldraw_lib__rect()],
// 1 16 -73.25 -11.25 2.875 40 0 0 0 -1 0 0 0 .25 rect.dat
  [1,16,-73.25,-11.25,2.875,40,0,0,0,-1,0,0,0,.25, ldraw_lib__rect()],
// 1 16 -17 -11.25 2.875 -6.25 0 0 0 -1 0 0 0 .25 rect.dat
  [1,16,-17,-11.25,2.875,-6.25,0,0,0,-1,0,0,0,.25, ldraw_lib__rect()],
// 
// 4 16 -217.75 -11.25 2.625 -217.75 -15.5 2.625 -217.75 -16 3.125 -217.75 -11.25 3.125
  [4,16,-217.75,-11.25,2.625,-217.75,-15.5,2.625,-217.75,-16,3.125,-217.75,-11.25,3.125],
// 4 16 -217.75 -15.5 -2.625 -217.75 -16 -3.125 -217.75 -16 3.125 -217.75 -15.5 2.625
  [4,16,-217.75,-15.5,-2.625,-217.75,-16,-3.125,-217.75,-16,3.125,-217.75,-15.5,2.625],
// 4 16 -217.75 -16 -3.125 -217.75 -15.5 -2.625 -217.75 -11.25 -2.625 -217.75 -11.25 -3.125
  [4,16,-217.75,-16,-3.125,-217.75,-15.5,-2.625,-217.75,-11.25,-2.625,-217.75,-11.25,-3.125],
// 
// 1 16 -217.75 -13.625 0 0 1 0 0 0 -2.375 3.125 0 0 recte3.dat
  [1,16,-217.75,-13.625,0,0,1,0,0,0,-2.375,3.125,0,0, ldraw_lib__recte3()],
// 1 16 -217.75 -13.375 0 0 1 0 0 0 -2.125 2.625 0 0 recte3.dat
  [1,16,-217.75,-13.375,0,0,1,0,0,0,-2.125,2.625,0,0, ldraw_lib__recte3()],
// 
// 3 16 -10.75 -15.5 2.625 -10.75 -15.5 1 -217.75 -15.5 2.625
  [3,16,-10.75,-15.5,2.625,-10.75,-15.5,1,-217.75,-15.5,2.625],
// 3 16 -8.25 -15.5 -.5 8.25 -15.5 -2.625 -217.75 -15.5 -2.625
  [3,16,-8.25,-15.5,-.5,8.25,-15.5,-2.625,-217.75,-15.5,-2.625],
// 3 16 -8.25 -15.5 -.5 -217.75 -15.5 -2.625 -10.75 -15.5 0
  [3,16,-8.25,-15.5,-.5,-217.75,-15.5,-2.625,-10.75,-15.5,0],
// 4 16 -10.75 -15.5 1 -10.75 -15.5 0 -217.75 -15.5 -2.625 -217.75 -15.5 2.625
  [4,16,-10.75,-15.5,1,-10.75,-15.5,0,-217.75,-15.5,-2.625,-217.75,-15.5,2.625],
// 
// 2 24 8.25 -15.5 -2.625 -217.75 -15.5 -2.625
  [2,24,8.25,-15.5,-2.625,-217.75,-15.5,-2.625],
// 2 24 -217.75 -15.5 2.625 -10.75 -15.5 2.625
  [2,24,-217.75,-15.5,2.625,-10.75,-15.5,2.625],
// 
// 4 16 -217.75 -16 3.125 -217.75 -16 -3.125 8.25 -16 -3.125 -10.75 -16 0
  [4,16,-217.75,-16,3.125,-217.75,-16,-3.125,8.25,-16,-3.125,-10.75,-16,0],
// 3 16 -10.75 -16 1 -10.75 -16 3.125 -217.75 -16 3.125
  [3,16,-10.75,-16,1,-10.75,-16,3.125,-217.75,-16,3.125],
// 3 16 -10.75 -16 0 -10.75 -16 1 -217.75 -16 3.125
  [3,16,-10.75,-16,0,-10.75,-16,1,-217.75,-16,3.125],
// 
// 2 24 -217.75 -16 3.125 -10.75 -16 3.125
  [2,24,-217.75,-16,3.125,-10.75,-16,3.125],
// 2 24 8.25 -16 -3.125 -217.75 -16 -3.125
  [2,24,8.25,-16,-3.125,-217.75,-16,-3.125],
];
module ldraw_lib__u9309(step=0, col=false, unit=2/5, alt=false, line=0.2, solid=!$preview)
    makepoly(ldraw_lib__u9309(), step=step, col=col, unit=unit, alt=alt, line=line, solid=solid);
ldraw_lib__u9309(line=0.2);
